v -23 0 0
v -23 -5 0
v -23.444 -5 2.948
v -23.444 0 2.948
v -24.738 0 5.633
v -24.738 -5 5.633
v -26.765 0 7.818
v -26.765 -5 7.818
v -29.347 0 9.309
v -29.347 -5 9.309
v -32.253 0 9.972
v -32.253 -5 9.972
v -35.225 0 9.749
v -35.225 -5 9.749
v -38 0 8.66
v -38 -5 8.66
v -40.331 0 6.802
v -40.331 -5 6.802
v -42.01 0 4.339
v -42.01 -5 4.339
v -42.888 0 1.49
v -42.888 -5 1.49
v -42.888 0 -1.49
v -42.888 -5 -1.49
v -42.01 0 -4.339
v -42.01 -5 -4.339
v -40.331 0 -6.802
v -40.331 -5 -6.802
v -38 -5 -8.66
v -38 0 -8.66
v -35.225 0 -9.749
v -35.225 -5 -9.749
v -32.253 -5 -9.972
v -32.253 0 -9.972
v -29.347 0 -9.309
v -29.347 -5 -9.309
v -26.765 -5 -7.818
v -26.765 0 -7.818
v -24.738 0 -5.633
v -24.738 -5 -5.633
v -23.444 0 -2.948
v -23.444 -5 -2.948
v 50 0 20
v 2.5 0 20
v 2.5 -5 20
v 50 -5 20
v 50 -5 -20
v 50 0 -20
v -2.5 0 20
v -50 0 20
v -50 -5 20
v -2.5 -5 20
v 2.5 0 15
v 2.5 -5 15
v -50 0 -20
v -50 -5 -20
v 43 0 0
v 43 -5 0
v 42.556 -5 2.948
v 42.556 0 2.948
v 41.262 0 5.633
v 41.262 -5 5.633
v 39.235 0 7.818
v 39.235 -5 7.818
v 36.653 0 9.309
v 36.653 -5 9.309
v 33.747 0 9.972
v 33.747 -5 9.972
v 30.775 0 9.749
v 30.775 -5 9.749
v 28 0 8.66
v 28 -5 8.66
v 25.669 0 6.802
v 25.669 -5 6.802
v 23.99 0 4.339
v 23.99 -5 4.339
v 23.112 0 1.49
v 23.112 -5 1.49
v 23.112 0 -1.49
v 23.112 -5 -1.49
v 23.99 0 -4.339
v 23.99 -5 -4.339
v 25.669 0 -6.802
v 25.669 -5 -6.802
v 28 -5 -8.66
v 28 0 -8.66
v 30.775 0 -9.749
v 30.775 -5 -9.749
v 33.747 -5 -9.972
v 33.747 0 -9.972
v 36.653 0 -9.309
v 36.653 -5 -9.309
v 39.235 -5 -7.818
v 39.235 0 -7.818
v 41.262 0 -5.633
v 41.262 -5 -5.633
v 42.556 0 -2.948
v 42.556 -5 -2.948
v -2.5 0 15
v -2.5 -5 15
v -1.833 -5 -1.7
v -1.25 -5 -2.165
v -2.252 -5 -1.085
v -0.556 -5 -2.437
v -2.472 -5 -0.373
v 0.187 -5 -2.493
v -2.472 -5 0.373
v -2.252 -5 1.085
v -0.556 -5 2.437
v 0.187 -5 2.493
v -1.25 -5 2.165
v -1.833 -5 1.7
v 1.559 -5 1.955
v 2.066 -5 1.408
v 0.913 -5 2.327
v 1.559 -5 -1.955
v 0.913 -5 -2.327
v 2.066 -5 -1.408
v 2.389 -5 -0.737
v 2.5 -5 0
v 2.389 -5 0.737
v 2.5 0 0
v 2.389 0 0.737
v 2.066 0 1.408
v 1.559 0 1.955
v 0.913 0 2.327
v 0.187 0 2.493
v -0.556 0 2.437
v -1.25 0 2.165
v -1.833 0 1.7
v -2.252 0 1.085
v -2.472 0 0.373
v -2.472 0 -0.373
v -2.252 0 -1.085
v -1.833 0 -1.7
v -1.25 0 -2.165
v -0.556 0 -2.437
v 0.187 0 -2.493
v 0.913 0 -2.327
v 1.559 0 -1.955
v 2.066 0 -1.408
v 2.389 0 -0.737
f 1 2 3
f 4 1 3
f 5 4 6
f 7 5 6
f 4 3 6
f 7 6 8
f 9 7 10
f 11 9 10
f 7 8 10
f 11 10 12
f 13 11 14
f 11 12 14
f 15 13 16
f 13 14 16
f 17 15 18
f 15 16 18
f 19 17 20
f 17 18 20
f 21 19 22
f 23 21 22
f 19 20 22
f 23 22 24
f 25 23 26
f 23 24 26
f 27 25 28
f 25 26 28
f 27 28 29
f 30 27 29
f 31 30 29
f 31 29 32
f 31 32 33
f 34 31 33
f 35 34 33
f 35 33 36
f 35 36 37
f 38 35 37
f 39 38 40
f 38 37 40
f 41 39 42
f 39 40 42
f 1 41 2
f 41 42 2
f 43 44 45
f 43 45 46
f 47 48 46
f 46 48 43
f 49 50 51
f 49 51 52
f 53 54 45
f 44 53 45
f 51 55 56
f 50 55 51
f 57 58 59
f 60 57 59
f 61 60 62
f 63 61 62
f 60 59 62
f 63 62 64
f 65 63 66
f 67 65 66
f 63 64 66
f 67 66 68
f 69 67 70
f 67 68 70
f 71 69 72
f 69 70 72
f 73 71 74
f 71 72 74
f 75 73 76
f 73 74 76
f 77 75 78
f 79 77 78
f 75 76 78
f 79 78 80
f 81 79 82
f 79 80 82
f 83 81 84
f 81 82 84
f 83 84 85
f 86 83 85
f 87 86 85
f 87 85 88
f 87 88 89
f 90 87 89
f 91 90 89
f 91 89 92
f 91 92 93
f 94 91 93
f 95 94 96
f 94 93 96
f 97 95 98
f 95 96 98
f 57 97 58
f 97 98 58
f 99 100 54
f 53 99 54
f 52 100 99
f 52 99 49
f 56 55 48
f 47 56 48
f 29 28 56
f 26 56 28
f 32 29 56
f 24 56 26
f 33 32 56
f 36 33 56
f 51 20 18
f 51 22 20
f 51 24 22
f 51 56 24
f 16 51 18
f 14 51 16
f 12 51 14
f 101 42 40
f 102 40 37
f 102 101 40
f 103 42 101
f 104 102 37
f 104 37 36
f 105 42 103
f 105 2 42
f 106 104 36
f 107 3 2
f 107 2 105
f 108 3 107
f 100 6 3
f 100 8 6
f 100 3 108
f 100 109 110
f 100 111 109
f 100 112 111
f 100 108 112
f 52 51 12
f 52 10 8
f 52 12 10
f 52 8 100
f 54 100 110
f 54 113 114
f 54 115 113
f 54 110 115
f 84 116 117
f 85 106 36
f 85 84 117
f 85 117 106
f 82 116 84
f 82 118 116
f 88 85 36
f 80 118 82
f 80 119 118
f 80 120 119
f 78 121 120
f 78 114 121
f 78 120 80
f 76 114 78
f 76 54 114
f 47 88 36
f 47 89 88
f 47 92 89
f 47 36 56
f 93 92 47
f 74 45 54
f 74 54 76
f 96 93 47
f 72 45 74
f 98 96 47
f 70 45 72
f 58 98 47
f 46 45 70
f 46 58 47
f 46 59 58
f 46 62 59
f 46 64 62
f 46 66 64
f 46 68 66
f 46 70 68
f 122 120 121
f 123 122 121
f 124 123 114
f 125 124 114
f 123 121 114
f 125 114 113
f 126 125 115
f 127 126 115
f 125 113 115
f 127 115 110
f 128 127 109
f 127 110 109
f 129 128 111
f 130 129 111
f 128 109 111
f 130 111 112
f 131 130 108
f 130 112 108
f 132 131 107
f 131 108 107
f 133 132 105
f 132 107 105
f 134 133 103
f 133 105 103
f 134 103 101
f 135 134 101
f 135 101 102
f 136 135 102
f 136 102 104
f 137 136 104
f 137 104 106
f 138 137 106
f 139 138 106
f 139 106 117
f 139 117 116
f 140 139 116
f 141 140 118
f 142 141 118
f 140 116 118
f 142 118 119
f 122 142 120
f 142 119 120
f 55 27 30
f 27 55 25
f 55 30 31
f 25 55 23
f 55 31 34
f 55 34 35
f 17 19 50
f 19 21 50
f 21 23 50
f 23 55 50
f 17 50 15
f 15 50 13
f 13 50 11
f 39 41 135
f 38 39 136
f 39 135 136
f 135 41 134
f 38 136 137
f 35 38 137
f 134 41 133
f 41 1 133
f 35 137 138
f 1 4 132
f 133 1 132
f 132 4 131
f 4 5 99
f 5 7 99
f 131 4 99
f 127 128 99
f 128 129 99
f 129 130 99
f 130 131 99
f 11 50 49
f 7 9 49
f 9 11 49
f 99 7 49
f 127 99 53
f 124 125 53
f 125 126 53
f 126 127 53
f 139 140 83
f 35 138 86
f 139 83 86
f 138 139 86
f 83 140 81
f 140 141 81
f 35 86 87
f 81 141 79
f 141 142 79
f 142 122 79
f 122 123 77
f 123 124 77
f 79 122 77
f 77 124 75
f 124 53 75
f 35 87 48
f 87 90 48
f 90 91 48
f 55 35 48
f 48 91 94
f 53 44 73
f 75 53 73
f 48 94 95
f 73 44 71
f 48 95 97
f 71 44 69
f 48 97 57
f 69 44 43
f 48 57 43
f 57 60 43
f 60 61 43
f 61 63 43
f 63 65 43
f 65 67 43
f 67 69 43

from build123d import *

# Parameters (mm, degrees)
F0_W     = 100
F0_H     = 40
F1_DEPTH = 5
F2_R     = 10
F2_R_2   = 2.5
F3_DEPTH = 5
F4_W     = 5
F4_H     = 5
F5_DEPTH = 5


with BuildPart() as f1:
    # F0 (on Front) → F1 (new body)
    with BuildSketch(Plane.XZ):
        Rectangle(F0_W, F0_H)
    extrude(amount=F1_DEPTH)

    # F2 (on face) → F3 (cut, through all)
    with BuildSketch(Plane.XZ.offset(5)):
        with Locations((-33, 0)):
            Circle(F2_R)
        Circle(F2_R_2)
        with Locations((33, 0)):
            Circle(F2_R)
    extrude(amount=-F3_DEPTH, mode=Mode.SUBTRACT)

    # F4 (on face) → F5 (cut, through all)
    with BuildSketch(Plane.XZ.offset(5)):
        with Locations((0, 17.5)):
            Rectangle(F4_W, F4_H)
    extrude(amount=-F5_DEPTH, mode=Mode.SUBTRACT)


solid = f1.part
